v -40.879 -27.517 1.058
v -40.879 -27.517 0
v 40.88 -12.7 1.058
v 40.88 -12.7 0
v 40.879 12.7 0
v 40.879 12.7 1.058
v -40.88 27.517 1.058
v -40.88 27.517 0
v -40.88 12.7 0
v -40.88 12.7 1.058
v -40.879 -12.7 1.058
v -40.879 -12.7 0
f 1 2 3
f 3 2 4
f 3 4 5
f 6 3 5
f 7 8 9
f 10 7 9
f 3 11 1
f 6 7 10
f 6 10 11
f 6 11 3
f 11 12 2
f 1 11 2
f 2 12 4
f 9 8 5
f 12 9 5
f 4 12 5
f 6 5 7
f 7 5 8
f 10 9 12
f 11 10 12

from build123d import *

# Parameters (mm, degrees)
F1_DEPTH = 1.058333


with BuildPart() as f1:
    # F0 (on Top) → F1 (new body)
    with BuildSketch(Plane.XY):
        Polygon((-40.879806, 12.7), (40.879447, 12.7), (-40.879806, 27.516667), align=None)
        Polygon((40.879806, -12.7), (40.879447, 12.7), (-40.879806, 12.7), (-40.879447, -12.7), align=None)
        Polygon((-40.879447, -27.516667), (40.879806, -12.7), (-40.879447, -12.7), align=None)
    extrude(amount=F1_DEPTH)


solid = f1.part
